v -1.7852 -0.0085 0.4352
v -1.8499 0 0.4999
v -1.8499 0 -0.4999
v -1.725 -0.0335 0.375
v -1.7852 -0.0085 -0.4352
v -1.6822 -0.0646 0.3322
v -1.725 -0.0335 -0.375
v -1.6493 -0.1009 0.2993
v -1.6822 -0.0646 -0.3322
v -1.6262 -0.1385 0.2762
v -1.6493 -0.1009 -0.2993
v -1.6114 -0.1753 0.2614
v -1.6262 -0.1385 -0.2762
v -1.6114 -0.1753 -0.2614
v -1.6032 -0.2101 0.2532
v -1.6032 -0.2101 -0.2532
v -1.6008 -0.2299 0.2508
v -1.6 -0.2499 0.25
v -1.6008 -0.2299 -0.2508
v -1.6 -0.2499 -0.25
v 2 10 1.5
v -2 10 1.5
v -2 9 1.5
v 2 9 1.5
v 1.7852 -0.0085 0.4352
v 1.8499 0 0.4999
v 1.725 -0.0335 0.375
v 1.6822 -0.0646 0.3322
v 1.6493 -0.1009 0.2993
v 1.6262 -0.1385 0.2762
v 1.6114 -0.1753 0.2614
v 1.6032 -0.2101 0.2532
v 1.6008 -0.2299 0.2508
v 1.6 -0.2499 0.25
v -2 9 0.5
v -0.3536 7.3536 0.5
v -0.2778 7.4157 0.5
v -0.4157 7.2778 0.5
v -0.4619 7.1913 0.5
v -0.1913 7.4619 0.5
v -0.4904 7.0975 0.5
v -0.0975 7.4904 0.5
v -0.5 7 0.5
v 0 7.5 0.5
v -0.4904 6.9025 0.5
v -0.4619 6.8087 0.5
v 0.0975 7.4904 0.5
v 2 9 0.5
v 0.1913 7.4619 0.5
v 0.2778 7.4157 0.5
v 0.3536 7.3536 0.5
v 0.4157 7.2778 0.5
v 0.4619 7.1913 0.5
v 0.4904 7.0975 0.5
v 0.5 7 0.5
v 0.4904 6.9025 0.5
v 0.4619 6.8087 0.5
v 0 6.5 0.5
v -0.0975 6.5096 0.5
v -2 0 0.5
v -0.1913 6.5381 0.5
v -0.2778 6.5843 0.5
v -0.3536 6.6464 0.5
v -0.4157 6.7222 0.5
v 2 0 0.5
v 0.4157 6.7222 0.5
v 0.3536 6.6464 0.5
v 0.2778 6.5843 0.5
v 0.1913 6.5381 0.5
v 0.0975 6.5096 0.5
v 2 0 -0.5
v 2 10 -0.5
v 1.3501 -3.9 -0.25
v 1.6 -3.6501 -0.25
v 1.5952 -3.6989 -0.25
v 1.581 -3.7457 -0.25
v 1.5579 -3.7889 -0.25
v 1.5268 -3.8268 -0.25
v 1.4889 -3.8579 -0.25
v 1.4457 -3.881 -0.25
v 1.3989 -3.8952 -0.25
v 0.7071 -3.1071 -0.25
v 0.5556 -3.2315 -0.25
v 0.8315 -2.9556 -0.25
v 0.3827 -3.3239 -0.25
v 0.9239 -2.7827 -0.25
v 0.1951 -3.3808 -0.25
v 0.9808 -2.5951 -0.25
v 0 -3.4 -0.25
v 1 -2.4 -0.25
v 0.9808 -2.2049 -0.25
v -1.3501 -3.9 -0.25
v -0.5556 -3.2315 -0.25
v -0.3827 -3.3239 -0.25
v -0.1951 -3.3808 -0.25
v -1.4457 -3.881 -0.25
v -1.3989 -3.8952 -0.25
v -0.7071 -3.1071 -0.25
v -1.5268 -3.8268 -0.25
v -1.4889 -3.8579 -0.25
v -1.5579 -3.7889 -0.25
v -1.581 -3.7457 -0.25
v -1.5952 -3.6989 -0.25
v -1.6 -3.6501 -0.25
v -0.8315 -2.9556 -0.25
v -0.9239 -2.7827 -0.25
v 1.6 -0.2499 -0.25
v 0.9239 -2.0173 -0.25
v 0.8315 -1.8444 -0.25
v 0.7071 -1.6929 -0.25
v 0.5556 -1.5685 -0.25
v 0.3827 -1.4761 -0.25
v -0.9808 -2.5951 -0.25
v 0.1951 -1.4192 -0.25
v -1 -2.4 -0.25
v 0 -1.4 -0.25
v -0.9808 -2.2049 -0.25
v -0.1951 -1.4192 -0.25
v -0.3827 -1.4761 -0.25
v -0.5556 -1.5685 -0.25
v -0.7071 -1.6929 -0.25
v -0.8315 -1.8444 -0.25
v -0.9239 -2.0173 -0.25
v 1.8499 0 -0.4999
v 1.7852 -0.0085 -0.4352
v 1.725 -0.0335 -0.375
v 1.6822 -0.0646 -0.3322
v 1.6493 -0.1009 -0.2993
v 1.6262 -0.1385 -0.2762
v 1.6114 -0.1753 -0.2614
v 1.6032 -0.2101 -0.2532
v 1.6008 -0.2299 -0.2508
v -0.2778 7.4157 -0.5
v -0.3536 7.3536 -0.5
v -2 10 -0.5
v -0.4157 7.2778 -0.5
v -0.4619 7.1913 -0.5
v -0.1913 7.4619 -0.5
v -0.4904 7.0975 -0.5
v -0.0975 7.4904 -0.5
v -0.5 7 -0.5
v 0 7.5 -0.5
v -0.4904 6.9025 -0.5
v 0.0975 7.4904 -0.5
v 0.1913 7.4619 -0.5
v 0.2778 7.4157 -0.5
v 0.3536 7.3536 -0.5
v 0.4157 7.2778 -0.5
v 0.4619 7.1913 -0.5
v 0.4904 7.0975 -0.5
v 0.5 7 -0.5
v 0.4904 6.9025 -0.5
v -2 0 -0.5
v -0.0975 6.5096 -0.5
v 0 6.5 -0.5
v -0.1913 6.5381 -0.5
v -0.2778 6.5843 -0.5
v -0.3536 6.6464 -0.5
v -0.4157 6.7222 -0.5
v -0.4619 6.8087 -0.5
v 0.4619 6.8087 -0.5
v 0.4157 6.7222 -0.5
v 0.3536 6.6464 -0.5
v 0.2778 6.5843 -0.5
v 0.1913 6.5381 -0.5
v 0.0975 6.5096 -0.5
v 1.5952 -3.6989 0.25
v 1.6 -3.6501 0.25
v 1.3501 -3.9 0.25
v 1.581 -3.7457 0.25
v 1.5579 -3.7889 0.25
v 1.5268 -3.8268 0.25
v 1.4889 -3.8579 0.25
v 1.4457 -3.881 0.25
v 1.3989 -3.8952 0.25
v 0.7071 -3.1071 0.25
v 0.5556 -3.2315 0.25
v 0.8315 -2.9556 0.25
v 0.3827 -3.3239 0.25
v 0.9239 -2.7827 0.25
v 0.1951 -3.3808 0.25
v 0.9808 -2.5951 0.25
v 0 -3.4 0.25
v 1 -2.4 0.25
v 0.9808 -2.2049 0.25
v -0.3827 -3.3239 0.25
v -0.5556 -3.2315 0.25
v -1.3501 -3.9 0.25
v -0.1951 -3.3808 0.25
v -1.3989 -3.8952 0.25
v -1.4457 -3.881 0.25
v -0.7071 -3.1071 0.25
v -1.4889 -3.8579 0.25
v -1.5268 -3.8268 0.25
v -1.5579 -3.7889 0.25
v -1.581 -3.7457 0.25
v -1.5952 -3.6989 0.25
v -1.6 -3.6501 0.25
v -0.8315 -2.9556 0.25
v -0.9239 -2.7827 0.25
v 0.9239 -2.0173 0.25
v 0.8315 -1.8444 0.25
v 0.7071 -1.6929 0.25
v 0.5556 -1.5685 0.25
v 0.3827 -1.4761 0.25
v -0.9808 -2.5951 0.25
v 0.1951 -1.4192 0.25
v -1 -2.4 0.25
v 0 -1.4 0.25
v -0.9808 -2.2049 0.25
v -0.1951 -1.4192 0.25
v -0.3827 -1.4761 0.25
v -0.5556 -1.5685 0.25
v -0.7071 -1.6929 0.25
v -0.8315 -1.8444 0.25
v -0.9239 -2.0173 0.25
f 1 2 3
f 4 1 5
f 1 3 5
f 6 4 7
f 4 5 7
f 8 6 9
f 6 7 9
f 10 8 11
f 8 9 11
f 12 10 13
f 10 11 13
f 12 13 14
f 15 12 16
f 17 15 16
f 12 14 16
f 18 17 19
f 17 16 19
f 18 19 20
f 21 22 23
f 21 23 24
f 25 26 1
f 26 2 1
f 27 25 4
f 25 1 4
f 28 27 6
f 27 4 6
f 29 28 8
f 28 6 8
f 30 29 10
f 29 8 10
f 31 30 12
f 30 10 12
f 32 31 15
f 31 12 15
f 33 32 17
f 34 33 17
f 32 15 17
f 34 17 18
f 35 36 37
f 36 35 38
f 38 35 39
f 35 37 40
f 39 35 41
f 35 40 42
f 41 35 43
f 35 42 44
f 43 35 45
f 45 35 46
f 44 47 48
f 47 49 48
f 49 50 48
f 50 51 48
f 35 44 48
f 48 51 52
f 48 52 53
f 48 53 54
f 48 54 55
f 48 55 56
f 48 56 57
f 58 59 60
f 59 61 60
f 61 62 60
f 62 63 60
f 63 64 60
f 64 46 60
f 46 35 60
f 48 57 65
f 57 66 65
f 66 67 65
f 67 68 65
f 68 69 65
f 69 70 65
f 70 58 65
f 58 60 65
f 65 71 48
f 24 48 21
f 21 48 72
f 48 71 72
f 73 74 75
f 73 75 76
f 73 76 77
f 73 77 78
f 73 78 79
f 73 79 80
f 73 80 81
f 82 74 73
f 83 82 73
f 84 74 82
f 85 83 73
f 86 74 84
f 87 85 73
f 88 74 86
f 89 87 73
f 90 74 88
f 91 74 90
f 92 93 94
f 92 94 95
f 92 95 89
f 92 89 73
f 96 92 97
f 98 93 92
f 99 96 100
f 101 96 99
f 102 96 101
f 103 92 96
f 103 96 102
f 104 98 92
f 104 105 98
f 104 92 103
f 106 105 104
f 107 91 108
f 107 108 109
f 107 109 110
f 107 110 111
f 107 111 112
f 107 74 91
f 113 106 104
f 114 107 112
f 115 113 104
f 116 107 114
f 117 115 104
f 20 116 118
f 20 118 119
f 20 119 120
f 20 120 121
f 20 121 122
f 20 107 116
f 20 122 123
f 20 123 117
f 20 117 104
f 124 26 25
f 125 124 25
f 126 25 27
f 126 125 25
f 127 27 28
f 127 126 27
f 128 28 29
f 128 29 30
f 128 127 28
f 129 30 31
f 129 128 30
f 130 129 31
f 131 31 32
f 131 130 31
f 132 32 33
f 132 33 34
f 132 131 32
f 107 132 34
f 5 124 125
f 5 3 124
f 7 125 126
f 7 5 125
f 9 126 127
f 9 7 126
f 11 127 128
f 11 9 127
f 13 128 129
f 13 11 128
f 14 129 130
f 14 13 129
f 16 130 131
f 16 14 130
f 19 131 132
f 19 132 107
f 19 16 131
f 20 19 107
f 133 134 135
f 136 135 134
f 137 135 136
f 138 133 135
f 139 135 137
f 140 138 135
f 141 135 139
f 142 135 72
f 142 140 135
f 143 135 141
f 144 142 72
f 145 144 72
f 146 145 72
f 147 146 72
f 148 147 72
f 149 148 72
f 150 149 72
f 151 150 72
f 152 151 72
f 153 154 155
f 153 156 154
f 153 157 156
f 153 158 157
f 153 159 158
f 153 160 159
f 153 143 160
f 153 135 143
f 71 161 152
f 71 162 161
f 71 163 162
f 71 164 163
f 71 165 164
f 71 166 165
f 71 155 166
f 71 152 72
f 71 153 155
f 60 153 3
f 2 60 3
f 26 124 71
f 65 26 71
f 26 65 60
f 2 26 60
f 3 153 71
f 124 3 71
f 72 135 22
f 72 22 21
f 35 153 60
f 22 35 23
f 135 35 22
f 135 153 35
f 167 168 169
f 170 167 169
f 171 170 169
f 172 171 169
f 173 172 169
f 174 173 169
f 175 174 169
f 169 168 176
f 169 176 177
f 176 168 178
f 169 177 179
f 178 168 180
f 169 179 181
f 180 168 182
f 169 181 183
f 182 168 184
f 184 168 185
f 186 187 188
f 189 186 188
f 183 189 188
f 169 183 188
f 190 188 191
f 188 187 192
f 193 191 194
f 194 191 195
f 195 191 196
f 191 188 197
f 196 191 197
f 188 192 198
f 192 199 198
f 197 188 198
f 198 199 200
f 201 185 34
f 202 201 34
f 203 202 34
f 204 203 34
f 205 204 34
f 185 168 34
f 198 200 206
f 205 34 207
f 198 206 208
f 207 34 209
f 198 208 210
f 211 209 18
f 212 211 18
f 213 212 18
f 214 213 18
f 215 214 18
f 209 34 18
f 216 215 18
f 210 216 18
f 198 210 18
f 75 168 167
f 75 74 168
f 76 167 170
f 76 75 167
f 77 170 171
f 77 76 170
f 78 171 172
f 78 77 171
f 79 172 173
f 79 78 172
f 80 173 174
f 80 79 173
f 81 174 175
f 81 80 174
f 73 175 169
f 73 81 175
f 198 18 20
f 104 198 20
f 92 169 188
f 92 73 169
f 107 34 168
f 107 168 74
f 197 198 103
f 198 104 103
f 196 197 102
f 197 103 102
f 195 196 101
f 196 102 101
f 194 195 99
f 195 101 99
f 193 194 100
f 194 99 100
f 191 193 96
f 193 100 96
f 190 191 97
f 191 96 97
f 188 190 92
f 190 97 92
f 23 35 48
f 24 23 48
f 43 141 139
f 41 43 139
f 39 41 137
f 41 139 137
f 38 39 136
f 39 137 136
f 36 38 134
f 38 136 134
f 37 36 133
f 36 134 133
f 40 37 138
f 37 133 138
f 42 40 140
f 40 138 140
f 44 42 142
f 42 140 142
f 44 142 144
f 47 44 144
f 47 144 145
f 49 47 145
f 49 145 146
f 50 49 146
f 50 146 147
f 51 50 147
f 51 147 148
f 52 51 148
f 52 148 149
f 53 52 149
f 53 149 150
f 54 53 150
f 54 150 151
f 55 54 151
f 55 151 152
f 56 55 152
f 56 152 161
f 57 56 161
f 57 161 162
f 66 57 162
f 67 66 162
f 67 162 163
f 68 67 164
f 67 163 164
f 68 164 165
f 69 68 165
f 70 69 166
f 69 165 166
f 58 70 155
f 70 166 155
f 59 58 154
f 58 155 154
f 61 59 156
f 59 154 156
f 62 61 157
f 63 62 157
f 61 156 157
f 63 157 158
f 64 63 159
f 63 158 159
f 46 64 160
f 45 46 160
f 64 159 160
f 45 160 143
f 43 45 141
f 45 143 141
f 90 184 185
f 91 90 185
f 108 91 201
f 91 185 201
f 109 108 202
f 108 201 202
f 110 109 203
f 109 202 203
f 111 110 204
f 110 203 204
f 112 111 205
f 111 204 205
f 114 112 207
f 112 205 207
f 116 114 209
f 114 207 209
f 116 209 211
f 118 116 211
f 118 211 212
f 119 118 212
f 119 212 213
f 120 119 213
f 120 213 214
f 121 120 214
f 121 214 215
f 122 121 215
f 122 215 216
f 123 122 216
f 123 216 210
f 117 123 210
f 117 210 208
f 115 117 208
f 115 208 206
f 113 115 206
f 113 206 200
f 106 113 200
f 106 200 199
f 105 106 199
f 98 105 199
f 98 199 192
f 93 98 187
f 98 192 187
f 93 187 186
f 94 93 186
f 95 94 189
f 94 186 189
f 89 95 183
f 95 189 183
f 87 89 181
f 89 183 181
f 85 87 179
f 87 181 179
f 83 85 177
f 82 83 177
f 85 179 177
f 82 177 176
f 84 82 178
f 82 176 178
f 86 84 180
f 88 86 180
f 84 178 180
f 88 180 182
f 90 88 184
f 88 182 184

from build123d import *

# Parameters (mm, degrees)
SZKIC1_W                    = 4
SZKIC1_H                    = 1
DODANIE_WYCI_GNI_CIE1_DEPTH = 10
SZKIC2_R                    = 0.5
WYTNIJ_WYCI_GNI_CIE1_DEPTH  = 10
SZKIC3_W                    = 4
SZKIC3_H                    = 1
DODANIE_WYCI_GNI_CIE2_DEPTH = 1
SZKIC4_W                    = 3.2
SZKIC4_H                    = 0.5
DODANIE_WYCI_GNI_CIE3_DEPTH = 3.9
SZKIC5_R                    = 1
WYTNIJ_WYCI_GNI_CIE2_DEPTH  = 3.9
ZAOKR_GLENIE1_R             = 0.25


with BuildPart() as part:
    # Szkic1 → Dodanie-wyciągnięcie1 (new body)
    with BuildSketch(Plane(origin=(0, 0, 0), x_dir=(1, 0, 0), z_dir=(0, 1, 0))):
        Rectangle(SZKIC1_W, SZKIC1_H)
    extrude(amount=DODANIE_WYCI_GNI_CIE1_DEPTH)

    # Szkic2 → Wytnij-wyciągnięcie1 (cut)
    with BuildSketch(Plane(origin=(0, 0, -0.5), x_dir=(-1, 0, 0), z_dir=(0, 0, -1))):
        with Locations((0, 7)):
            Circle(SZKIC2_R)
    extrude(amount=-WYTNIJ_WYCI_GNI_CIE1_DEPTH, mode=Mode.SUBTRACT)

    # Szkic3 → Dodanie-wyciągnięcie2 (add)
    with BuildSketch(Plane.XY.offset(0.5)):
        with Locations((0, 9.5)):
            Rectangle(SZKIC3_W, SZKIC3_H)
    extrude(amount=DODANIE_WYCI_GNI_CIE2_DEPTH)

    # Szkic4 → Dodanie-wyciągnięcie3 (add)
    with BuildSketch(Plane(origin=(0, 0, 0), x_dir=(-1, 0, 0), z_dir=(0, -1, 0))):
        Rectangle(SZKIC4_W, SZKIC4_H)
    extrude(amount=DODANIE_WYCI_GNI_CIE3_DEPTH)

    # Szkic5 → Wytnij-wyciągnięcie2 (cut)
    with BuildSketch(Plane.XY.offset(0.25)):
        with Locations((0, -2.4)):
            Circle(SZKIC5_R)
    extrude(amount=-WYTNIJ_WYCI_GNI_CIE2_DEPTH, mode=Mode.SUBTRACT)

    # Zaokrąglenie1
    zaokr_glenie1_edges = [part.edges().sort_by_distance(p)[0] for p in [
        (-1.6, 0, 0),
        (0, 0, -0.25),
        (1.6, 0, 0),
        (0, 0, 0.25),
        (-1.6, -3.9, 0),
        (1.6, -3.9, 0),
    ]]
    fillet(zaokr_glenie1_edges, radius=ZAOKR_GLENIE1_R - 0.0001)  # a hair under: the kernel refuses the full size


solid = part.part
